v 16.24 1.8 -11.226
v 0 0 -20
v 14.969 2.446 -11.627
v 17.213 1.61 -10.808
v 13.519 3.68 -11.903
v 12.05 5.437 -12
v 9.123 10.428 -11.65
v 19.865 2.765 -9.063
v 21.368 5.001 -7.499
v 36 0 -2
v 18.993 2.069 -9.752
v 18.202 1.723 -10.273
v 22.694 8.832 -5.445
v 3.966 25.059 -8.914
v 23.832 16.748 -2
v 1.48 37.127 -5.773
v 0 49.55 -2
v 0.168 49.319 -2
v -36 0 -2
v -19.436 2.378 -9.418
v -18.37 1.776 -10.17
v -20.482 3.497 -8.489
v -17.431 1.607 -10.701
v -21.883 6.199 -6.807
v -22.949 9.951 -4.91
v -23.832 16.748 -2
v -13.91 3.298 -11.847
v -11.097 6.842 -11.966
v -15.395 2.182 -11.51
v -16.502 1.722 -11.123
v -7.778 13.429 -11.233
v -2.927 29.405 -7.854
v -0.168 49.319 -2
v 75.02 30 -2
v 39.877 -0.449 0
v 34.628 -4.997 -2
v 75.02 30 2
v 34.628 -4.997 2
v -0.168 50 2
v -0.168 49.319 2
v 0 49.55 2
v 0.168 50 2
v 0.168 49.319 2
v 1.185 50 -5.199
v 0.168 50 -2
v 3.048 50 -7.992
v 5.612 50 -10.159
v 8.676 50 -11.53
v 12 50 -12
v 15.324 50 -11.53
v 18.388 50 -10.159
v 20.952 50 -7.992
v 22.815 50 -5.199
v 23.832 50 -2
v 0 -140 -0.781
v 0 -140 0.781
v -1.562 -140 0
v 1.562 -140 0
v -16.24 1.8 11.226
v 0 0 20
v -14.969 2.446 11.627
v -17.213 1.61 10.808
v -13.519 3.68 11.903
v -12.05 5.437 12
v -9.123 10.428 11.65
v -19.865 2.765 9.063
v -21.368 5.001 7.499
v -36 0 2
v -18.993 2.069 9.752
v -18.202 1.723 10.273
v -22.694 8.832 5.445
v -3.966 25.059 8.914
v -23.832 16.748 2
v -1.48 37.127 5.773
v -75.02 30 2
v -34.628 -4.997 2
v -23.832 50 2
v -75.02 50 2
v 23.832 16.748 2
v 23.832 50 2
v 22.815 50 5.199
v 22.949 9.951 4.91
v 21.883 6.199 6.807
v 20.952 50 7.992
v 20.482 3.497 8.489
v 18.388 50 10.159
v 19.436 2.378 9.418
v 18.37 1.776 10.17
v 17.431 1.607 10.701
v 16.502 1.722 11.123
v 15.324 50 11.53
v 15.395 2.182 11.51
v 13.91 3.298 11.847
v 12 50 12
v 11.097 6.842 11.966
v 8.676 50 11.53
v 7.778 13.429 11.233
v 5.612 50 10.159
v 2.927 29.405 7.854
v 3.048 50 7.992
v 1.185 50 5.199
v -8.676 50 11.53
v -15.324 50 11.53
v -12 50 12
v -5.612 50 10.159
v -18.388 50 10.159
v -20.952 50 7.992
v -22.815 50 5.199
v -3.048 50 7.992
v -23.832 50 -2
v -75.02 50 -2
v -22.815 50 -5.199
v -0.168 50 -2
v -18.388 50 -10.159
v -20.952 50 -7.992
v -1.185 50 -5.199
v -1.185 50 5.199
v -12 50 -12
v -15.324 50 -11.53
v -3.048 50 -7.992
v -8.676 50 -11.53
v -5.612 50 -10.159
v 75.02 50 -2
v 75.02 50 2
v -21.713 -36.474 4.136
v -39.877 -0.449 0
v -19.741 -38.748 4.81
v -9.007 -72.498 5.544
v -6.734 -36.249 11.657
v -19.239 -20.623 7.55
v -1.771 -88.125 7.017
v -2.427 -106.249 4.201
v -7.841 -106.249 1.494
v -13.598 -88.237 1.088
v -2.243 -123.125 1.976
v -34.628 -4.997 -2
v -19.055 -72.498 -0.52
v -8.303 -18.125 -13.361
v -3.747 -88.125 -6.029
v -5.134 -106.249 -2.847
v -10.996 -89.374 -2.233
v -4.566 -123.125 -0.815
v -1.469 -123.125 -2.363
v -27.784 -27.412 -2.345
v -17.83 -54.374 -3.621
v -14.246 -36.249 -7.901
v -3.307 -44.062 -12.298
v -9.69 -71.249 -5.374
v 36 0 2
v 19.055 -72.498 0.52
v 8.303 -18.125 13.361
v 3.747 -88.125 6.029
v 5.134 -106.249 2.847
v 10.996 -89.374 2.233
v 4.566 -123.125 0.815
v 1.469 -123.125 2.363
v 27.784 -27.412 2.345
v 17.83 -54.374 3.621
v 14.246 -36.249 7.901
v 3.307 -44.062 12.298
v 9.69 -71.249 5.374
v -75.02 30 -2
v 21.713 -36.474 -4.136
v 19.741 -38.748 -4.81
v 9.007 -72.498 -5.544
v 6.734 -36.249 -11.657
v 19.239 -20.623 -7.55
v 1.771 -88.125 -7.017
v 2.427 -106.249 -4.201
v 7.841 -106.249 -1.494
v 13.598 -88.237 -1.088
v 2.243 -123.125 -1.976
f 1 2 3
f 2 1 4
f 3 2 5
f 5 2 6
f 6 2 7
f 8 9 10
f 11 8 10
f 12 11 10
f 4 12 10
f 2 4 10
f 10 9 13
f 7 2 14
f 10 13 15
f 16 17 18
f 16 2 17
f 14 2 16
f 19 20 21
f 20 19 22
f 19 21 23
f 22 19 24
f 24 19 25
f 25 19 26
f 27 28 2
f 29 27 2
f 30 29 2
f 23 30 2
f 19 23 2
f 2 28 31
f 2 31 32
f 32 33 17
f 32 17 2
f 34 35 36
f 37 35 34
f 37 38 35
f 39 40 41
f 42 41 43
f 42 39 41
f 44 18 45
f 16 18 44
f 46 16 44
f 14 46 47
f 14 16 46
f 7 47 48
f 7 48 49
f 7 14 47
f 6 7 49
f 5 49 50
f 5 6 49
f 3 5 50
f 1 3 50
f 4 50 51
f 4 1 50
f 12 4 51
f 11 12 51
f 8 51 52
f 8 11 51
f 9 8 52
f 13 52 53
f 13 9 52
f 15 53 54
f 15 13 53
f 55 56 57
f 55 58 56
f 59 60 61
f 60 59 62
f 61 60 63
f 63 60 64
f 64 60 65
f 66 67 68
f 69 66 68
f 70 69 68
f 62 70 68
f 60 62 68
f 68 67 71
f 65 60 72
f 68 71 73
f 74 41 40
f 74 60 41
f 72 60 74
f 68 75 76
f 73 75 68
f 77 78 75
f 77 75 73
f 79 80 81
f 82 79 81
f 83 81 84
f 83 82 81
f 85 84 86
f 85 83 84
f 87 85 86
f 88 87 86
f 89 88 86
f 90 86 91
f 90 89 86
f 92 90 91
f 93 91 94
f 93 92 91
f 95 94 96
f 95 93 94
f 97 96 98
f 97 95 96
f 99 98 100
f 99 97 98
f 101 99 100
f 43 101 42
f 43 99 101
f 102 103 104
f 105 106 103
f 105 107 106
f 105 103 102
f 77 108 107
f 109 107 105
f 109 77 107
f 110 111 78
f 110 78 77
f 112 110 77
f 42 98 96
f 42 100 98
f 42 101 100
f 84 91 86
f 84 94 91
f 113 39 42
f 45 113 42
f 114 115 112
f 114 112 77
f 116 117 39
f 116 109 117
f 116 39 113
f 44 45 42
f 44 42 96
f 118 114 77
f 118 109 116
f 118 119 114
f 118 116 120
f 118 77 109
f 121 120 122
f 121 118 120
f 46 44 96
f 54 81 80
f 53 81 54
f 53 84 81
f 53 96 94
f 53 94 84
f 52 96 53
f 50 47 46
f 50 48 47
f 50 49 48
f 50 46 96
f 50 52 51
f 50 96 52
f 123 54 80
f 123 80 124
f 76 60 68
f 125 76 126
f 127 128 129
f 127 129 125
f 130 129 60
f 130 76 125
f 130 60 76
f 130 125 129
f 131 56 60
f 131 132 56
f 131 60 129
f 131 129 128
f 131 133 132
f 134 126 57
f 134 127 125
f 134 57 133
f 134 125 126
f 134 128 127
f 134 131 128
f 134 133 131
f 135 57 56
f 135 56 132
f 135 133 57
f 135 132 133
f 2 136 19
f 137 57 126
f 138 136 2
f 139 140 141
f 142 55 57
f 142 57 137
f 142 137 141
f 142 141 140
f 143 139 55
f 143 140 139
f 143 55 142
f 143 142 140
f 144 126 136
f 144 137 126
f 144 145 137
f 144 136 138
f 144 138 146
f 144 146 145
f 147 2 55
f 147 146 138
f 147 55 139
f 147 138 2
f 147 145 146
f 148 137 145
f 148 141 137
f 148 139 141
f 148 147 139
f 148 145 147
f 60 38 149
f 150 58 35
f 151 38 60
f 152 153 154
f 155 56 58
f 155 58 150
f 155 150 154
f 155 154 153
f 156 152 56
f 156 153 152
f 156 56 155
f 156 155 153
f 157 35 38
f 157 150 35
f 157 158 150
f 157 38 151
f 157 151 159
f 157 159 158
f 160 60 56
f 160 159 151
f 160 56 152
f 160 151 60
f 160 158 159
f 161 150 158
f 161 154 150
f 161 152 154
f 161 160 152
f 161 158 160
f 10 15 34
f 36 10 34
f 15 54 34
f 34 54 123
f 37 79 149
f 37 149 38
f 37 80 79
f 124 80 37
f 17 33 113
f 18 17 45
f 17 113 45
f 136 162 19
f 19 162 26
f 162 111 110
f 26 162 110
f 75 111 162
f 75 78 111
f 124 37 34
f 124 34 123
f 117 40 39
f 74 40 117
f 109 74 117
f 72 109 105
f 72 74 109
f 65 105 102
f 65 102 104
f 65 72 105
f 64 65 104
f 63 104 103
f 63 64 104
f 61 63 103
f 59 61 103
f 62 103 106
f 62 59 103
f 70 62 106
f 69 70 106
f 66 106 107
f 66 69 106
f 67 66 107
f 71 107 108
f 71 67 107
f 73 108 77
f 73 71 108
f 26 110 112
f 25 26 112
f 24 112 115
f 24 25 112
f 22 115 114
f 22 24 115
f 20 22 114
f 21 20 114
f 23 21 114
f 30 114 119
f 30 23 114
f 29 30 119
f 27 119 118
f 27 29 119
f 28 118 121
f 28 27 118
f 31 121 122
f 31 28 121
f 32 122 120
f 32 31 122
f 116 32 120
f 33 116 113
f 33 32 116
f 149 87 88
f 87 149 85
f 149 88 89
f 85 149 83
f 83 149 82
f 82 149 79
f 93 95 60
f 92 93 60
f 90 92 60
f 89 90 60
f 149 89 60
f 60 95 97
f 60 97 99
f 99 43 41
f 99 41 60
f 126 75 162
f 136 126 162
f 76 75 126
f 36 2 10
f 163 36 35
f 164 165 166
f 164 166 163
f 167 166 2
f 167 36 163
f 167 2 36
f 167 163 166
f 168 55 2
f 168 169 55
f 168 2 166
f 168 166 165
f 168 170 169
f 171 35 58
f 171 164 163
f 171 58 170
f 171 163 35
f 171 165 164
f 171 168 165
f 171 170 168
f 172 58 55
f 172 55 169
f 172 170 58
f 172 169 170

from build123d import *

# Parameters (mm, degrees)
F1_DEPTH      = 140
F1_TAPER      = 7
F1_DEPTH_BACK = 50
F1_TAPER_BACK = 18
F3_DEPTH      = 2
F4_R          = 12
F5_DEPTH      = 50


with BuildPart() as f1:
    # F0 (on Front) → F1 (new body, two sides)
    with BuildSketch(Plane.XZ) as f1_sk:
        Polygon((0, 20), (-40, 0), (0, -20), (40, 0), align=None)
    extrude(amount=F1_DEPTH, taper=F1_TAPER)
    extrude(f1_sk.sketch, amount=-F1_DEPTH_BACK, taper=F1_TAPER_BACK)

    # F2 (on Top) → F3 (join, symmetric)
    with BuildSketch(Plane.XY):
        Polygon((0, 50), (0, -35), (75.0196278095, 30), (75.0196278095, 50), align=None)
        Polygon((-75.0196278095, 30), (0, -35), (0, 50), (-75.0196278095, 50), align=None)
    extrude(amount=F3_DEPTH, both=True)

    # F4 (on Front) → F5 (join)
    with BuildSketch(Plane.XZ):
        with BuildLine():
            ThreePointArc((0, 0), (12, -12), (24, 0))
            ThreePointArc((24, 0), (12, 12), (0, 0))
        make_face()
        with Locations((-12, 0)):
            Circle(F4_R)
    extrude(amount=-F5_DEPTH)


solid = f1.part
